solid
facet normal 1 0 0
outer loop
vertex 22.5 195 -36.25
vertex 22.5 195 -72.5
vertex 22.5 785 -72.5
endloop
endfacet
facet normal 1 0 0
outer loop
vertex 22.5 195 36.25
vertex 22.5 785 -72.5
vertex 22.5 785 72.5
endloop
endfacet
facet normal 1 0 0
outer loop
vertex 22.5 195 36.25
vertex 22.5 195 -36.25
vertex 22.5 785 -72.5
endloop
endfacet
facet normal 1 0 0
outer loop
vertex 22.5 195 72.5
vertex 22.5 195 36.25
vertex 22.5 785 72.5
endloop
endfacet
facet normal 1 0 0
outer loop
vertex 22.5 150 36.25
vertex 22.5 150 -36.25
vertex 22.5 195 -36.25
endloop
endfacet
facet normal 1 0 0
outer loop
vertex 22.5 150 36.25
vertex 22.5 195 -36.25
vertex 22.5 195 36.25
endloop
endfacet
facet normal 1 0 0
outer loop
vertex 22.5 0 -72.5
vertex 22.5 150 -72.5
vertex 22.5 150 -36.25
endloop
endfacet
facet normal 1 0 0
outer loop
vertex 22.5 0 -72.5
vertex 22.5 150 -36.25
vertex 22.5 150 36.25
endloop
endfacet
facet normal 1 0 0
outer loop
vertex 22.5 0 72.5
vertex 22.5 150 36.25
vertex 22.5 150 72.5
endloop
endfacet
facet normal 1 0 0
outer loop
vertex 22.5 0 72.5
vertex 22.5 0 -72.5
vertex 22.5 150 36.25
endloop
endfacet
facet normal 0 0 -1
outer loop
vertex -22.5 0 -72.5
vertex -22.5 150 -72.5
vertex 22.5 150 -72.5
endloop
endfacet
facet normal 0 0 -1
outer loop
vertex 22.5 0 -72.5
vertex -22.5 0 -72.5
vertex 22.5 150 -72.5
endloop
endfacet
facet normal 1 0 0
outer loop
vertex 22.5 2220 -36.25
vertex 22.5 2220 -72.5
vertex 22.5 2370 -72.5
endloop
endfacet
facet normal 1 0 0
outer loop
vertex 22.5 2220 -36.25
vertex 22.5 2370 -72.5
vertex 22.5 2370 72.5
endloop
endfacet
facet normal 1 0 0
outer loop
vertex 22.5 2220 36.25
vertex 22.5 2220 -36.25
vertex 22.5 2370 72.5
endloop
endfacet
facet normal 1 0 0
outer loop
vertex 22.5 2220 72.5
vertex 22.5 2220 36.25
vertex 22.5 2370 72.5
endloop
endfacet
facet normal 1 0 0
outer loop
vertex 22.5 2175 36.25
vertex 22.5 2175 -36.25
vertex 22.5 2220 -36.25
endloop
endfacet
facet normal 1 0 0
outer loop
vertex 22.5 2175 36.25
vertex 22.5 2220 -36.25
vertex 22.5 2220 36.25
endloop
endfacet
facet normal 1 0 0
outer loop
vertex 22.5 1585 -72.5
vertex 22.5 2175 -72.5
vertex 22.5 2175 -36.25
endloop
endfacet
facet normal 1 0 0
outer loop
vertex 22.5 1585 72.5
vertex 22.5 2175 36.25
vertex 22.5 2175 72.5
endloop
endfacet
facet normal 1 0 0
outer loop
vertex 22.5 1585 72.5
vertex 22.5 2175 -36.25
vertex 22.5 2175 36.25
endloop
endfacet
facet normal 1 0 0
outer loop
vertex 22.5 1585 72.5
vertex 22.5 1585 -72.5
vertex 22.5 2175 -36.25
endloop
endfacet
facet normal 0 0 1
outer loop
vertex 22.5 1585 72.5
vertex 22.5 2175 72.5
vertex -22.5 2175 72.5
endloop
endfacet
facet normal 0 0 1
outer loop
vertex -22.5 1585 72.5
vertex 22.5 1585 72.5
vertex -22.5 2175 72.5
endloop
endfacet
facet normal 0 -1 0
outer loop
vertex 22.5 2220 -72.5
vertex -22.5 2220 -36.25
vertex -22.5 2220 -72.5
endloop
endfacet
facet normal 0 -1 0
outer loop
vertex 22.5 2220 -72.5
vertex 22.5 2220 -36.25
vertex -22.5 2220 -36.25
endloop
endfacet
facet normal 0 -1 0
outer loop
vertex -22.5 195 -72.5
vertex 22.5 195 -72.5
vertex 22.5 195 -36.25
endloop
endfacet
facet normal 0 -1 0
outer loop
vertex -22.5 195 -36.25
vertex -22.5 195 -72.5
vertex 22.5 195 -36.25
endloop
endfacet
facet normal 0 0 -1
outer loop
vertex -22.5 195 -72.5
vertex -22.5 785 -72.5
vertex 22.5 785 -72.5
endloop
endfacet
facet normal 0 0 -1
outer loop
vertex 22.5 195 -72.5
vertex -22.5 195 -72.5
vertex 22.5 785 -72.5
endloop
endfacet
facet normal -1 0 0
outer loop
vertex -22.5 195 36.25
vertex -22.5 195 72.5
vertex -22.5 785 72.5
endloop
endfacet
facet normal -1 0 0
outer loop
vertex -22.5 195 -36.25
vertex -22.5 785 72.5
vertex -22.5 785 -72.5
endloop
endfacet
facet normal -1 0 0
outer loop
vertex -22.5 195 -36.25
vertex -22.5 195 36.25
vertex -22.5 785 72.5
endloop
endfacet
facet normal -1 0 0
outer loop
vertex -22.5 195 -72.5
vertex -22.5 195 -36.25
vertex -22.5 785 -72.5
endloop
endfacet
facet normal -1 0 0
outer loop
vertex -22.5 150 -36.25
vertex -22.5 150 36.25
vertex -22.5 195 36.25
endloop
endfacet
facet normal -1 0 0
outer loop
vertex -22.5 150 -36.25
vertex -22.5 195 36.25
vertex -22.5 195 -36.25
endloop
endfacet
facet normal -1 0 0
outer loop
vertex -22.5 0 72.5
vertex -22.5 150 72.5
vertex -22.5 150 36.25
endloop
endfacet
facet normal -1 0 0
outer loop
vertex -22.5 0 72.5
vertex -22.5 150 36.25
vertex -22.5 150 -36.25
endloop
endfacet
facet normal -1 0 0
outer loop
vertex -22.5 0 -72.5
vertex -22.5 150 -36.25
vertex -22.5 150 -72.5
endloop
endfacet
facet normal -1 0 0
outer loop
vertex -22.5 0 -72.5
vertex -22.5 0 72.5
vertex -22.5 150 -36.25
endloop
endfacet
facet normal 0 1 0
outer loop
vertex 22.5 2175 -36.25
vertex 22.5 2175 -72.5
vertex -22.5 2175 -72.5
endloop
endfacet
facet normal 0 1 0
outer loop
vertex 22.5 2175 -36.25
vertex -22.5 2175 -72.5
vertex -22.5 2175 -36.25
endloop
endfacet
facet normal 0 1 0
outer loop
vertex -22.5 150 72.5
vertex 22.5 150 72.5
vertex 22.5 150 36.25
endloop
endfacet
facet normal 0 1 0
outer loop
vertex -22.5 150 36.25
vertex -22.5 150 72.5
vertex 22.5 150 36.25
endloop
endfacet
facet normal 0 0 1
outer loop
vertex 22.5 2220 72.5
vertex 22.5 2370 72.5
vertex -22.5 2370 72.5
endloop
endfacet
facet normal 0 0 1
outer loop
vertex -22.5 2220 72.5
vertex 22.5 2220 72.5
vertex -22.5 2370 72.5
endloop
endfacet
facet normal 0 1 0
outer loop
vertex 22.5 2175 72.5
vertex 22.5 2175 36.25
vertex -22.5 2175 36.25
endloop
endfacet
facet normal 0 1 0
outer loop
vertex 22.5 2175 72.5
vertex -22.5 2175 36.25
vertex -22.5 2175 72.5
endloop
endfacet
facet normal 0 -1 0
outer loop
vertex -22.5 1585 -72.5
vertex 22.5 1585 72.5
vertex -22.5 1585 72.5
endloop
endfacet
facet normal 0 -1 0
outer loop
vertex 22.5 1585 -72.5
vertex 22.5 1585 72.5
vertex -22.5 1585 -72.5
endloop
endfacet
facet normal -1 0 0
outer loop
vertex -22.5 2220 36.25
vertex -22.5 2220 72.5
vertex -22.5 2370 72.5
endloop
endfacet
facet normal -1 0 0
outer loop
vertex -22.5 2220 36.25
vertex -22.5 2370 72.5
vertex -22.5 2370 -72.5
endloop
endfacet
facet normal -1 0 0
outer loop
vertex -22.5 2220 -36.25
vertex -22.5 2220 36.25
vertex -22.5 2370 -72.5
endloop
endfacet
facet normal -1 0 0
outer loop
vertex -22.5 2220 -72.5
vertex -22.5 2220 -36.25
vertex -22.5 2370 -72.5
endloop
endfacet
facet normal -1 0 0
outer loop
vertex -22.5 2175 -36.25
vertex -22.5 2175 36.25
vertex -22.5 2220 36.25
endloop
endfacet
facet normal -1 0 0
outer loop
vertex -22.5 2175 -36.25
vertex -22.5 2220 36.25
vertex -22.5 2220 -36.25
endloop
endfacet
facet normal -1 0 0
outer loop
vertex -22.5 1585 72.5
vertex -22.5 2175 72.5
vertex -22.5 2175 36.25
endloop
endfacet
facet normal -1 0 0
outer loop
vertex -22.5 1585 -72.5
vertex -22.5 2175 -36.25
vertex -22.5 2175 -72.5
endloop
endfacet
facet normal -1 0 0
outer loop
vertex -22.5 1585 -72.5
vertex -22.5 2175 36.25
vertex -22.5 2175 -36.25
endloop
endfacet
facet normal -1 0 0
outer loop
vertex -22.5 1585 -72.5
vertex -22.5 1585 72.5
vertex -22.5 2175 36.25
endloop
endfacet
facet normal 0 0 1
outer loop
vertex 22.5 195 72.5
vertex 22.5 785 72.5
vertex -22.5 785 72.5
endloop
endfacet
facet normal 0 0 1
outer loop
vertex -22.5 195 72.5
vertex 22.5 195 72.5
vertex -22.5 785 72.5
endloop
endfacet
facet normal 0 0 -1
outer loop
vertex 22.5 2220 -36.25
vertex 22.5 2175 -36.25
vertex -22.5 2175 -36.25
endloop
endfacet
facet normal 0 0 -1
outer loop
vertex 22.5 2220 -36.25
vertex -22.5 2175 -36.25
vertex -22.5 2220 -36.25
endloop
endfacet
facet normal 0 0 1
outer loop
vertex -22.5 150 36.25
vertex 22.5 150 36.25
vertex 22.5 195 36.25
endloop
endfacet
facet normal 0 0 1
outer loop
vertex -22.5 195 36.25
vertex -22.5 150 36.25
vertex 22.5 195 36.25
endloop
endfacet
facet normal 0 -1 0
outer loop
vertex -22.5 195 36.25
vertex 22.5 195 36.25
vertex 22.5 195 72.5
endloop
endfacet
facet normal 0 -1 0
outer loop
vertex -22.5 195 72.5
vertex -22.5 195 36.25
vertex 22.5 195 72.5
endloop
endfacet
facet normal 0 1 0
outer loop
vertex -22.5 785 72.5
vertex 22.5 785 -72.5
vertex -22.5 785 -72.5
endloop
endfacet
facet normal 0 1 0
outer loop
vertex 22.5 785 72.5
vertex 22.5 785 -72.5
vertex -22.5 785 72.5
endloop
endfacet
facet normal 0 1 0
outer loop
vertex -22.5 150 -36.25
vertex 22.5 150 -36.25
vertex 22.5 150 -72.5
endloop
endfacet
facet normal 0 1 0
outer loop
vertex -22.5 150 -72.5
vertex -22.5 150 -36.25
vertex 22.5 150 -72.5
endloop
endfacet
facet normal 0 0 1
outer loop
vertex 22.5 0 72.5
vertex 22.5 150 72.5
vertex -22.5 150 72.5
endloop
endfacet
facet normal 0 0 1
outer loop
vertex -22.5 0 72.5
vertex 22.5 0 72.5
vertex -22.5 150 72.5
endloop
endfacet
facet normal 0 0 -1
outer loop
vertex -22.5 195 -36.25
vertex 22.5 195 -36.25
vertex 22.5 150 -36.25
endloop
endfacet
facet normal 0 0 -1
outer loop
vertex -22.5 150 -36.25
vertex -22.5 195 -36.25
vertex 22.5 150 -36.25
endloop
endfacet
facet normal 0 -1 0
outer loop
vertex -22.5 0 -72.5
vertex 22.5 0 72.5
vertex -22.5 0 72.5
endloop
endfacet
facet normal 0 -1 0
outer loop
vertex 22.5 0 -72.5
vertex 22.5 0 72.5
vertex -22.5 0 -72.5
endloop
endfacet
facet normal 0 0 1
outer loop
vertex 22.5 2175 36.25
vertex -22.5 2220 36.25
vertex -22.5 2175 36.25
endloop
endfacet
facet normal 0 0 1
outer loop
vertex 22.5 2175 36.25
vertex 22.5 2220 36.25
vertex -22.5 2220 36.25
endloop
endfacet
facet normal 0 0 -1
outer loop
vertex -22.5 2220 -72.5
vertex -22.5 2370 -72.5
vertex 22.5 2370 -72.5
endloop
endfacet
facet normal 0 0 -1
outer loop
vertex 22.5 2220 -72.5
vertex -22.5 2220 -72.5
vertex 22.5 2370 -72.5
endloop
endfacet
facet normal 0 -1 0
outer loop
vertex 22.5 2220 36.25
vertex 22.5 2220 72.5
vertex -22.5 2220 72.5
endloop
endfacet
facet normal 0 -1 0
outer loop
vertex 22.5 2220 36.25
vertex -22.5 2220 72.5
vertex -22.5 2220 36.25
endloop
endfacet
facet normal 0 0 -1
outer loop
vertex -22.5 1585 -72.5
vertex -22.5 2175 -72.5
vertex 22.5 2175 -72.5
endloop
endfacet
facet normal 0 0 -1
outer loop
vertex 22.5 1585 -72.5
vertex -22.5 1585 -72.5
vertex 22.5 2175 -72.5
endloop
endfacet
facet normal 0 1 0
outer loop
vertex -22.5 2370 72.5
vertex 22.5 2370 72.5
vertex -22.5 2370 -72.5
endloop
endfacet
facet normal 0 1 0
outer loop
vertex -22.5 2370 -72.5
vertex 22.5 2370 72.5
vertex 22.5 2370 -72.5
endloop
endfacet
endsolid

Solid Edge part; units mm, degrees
sketch "Sketch1" plane through (0, 0, 0) normal (0, -1, 0) x (1, 0, 0)
  line L0 (-22.5, -72.5) -> (22.5, -72.5)
  line L1 (22.5, -72.5) -> (22.5, 72.5)
  line L2 (22.5, 72.5) -> (-22.5, 72.5)
  line L3 (-22.5, 72.5) -> (-22.5, -72.5)
extrude "Protrusion1" add sketch "Sketch1" against normal blind 2370
sketch "Sketch2" plane through (22.5, 1185, 0) normal (1, 0, 0) x (0, 1, 0)
  line L0 (1035, 72.5) -> (1035, 36.25)
  line L1 (1035, 36.25) -> (990, 36.25)
  line L2 (990, 36.25) -> (990, 72.5)
  line L3 (990, 72.5) -> (1035, 72.5)
  line L4 (-1035, 72.5) -> (-1035, 36.25)
  line L5 (-1035, 36.25) -> (-990, 36.25)
  line L6 (-990, 36.25) -> (-990, 72.5)
  line L7 (-990, 72.5) -> (-1035, 72.5)
extrude "ExtrudedCutout_1" cut sketch "Sketch2" against normal blind 89.2118
mirror "Mirror1" about plane through (0, 0, 0) normal (0, 0, -1) of "ExtrudedCutout_1"
sketch "Sketch3" plane through (22.5, 1185, 0) normal (1, 0, 0) x (0, 1, 0)
  line L0 (-400, -72.5) -> (-400, 72.5)
  line L1 (-400, 72.5) -> (400, 72.5)
  line L2 (400, 72.5) -> (400, -72.5)
  line L3 (400, -72.5) -> (-400, -72.5)
extrude "ExtrudedCutout_2" cut sketch "Sketch3" against normal blind 464.0383
properties material "Wood, Pine"
